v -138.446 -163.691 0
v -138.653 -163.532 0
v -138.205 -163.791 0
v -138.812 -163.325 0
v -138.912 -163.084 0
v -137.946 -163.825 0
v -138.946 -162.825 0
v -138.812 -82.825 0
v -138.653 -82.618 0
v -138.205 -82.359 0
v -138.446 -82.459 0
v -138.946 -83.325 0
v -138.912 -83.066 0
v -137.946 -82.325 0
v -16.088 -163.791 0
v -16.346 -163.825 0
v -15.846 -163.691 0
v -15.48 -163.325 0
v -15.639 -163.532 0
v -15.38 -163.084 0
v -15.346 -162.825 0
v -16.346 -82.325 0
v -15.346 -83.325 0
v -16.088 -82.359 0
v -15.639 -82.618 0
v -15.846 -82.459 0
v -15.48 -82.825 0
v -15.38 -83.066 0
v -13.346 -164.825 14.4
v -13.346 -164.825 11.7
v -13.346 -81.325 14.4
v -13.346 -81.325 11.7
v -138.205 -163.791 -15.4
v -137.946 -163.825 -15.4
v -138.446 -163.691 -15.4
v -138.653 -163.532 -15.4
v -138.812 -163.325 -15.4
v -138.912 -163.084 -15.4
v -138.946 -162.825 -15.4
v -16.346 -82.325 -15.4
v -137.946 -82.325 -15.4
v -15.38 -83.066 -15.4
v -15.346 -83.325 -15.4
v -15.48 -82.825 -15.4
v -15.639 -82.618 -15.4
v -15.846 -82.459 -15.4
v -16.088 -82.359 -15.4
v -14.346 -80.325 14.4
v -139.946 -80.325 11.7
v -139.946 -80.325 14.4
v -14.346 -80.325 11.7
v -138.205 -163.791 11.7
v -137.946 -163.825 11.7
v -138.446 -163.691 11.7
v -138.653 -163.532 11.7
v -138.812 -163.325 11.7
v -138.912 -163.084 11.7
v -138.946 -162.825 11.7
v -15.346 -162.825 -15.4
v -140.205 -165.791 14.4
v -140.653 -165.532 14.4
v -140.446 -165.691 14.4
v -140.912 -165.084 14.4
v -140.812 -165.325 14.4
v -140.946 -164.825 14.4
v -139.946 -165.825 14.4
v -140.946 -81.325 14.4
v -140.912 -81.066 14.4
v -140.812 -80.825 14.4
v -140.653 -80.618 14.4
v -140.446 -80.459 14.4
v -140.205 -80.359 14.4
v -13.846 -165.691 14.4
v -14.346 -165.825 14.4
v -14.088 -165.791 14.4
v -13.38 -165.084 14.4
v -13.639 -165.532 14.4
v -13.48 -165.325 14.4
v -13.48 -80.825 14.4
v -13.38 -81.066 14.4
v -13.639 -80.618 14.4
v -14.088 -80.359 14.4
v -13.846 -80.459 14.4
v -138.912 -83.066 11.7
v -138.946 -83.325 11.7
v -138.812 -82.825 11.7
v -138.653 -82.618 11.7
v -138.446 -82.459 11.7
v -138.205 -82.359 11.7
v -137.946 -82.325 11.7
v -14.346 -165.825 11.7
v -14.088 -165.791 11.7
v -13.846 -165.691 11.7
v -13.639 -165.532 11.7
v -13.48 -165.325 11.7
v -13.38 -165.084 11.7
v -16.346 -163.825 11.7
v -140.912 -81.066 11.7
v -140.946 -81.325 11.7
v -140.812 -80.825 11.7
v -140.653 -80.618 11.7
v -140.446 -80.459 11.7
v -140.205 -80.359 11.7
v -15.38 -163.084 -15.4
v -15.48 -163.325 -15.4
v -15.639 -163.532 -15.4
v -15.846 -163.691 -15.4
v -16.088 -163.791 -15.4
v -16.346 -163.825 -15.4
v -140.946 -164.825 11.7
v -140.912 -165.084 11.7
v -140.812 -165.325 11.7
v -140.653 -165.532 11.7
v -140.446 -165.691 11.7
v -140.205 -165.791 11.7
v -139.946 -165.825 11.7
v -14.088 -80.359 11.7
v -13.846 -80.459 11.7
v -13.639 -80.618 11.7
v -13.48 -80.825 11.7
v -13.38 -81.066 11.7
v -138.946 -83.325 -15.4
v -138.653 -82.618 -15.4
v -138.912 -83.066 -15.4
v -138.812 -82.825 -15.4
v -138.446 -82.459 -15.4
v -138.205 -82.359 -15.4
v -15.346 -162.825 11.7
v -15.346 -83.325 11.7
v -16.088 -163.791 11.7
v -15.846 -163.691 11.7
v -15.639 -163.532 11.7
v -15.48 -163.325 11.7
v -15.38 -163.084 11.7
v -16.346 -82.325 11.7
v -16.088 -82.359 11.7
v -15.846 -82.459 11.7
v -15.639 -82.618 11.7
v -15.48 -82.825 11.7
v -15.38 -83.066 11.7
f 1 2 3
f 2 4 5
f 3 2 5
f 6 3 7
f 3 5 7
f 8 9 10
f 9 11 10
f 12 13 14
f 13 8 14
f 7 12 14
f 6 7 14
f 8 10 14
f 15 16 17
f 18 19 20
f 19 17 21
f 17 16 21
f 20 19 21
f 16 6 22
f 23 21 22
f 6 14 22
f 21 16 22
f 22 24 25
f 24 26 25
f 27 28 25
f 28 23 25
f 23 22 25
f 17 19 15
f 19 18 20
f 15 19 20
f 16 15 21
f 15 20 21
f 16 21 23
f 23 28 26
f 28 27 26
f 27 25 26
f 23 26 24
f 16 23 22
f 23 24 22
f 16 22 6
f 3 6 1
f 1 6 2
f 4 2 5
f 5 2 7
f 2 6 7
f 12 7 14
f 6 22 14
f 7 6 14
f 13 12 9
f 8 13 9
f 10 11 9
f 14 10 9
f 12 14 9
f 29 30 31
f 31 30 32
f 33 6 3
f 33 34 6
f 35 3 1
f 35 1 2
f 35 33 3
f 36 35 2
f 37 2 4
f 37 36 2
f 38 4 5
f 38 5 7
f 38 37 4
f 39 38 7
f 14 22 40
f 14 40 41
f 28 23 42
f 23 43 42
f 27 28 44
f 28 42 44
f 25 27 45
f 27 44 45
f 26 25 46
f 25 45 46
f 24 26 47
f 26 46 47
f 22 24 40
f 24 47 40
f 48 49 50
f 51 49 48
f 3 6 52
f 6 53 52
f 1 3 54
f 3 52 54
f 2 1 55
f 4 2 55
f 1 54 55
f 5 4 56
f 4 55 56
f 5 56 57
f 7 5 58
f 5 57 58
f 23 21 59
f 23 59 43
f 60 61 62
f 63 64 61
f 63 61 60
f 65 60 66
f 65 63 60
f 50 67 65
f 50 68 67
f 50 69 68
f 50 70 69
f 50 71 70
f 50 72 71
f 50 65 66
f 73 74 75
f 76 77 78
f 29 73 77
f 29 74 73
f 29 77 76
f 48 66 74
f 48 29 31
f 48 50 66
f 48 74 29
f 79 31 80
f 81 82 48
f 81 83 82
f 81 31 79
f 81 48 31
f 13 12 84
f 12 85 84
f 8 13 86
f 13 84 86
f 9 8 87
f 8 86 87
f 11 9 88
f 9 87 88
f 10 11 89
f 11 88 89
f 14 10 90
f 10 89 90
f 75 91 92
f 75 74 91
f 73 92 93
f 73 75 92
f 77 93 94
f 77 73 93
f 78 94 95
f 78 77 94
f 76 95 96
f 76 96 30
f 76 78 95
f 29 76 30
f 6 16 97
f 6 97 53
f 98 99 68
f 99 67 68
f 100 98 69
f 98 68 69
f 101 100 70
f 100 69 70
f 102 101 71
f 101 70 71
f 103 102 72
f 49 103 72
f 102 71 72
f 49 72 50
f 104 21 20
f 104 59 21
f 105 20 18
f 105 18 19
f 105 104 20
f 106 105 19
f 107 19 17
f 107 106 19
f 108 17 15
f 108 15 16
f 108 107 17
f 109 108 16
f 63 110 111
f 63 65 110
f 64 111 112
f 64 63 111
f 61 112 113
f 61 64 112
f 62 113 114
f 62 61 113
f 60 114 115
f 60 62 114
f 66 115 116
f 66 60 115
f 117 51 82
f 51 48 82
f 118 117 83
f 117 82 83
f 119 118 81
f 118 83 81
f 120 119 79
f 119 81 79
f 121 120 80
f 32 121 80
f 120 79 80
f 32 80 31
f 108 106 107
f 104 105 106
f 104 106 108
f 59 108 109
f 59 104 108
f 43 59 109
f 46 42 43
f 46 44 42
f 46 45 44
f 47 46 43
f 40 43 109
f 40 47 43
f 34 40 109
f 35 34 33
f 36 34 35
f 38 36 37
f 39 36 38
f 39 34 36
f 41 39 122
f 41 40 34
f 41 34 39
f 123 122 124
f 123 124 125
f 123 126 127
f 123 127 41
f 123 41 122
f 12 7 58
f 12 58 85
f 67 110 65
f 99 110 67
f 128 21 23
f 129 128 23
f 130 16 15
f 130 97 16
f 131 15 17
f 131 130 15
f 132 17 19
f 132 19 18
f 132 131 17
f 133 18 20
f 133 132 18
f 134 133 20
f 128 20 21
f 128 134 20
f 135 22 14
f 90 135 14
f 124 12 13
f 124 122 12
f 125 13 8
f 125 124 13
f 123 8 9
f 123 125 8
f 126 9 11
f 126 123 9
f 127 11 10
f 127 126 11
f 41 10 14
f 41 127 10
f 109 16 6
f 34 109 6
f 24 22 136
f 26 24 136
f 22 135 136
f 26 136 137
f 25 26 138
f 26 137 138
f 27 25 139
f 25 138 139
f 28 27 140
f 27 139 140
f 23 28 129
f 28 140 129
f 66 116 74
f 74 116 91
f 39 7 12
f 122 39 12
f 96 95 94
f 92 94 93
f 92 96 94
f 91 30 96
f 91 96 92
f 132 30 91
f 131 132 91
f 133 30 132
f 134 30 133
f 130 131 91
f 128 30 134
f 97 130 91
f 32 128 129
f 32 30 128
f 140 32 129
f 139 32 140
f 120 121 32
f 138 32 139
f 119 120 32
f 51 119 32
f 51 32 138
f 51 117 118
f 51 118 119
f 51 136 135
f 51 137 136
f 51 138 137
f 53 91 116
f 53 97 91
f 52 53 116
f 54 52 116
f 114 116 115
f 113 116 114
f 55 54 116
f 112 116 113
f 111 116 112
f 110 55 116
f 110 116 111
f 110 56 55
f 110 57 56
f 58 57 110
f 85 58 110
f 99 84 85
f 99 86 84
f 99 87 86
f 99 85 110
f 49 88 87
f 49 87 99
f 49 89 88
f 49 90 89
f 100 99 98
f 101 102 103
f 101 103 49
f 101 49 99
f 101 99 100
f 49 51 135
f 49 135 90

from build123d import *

# Parameters (mm, degrees)
SKETCH1_W           = 127.6
SKETCH1_H           = 85.5
BOSS_EXTRUDE1_DEPTH = 14.4
SKETCH2_W           = 127.6
SKETCH2_H           = 85.5
SKETCH2_W_2         = 123.6
SKETCH2_H_2         = 81.5
CUT_EXTRUDE1_DEPTH  = 11.7
SKETCH3_W           = 123.6
SKETCH3_H           = 81.5
BOSS_EXTRUDE2_DEPTH = 15.4
FILLET1_R           = 1
FILLET2_R           = 1


with BuildPart() as part:
    # Sketch1 → Boss-Extrude1 (new body)
    with BuildSketch(Plane.XY):
        with Locations((-77.146382855, -123.07484112)):
            Rectangle(SKETCH1_W, SKETCH1_H)
    extrude(amount=BOSS_EXTRUDE1_DEPTH)

    # Sketch2 → Cut-Extrude1 (cut)
    with BuildSketch(Plane(origin=(0, 0, 0), x_dir=(-1, 0, 0), z_dir=(0, 0, -1))):
        with Locations((77.146382855, -123.07484112)):
            Rectangle(SKETCH2_W, SKETCH2_H)
        with Locations((77.146382855, -123.07484112)):
            Rectangle(SKETCH2_W_2, SKETCH2_H_2, mode=Mode.SUBTRACT)
    extrude(amount=-CUT_EXTRUDE1_DEPTH, mode=Mode.SUBTRACT)

    # Fillet1
    fillet1_edges = [part.edges().sort_by_distance(p)[0] for p in [
        (-138.946382855, -82.32484112, 5.85),
        (-138.946382855, -163.82484112, 5.85),
        (-15.346382855, -163.82484112, 5.85),
        (-15.346382855, -82.32484112, 5.85),
        (-13.346382855, -165.82484112, 13.05),
        (-140.946382855, -165.82484112, 13.05),
        (-140.946382855, -80.32484112, 13.05),
        (-13.346382855, -80.32484112, 13.05),
    ]]
    fillet(fillet1_edges, radius=FILLET1_R)


with BuildPart() as body_2:
    # Sketch3 → Boss-Extrude2 (new body)
    with BuildSketch(Plane(origin=(0, 0, 0), x_dir=(-1, 0, 0), z_dir=(0, 0, -1))):
        with Locations((77.146382855, -123.07484112)):
            Rectangle(SKETCH3_W, SKETCH3_H)
    extrude(amount=BOSS_EXTRUDE2_DEPTH)

    # Fillet2
    fillet2_edges = [body_2.edges().sort_by_distance(p)[0] for p in [
        (-138.946382855, -163.82484112, -7.7),
        (-15.346382855, -163.82484112, -7.7),
        (-15.346382855, -82.32484112, -7.7),
        (-138.946382855, -82.32484112, -7.7),
    ]]
    fillet(fillet2_edges, radius=FILLET2_R)


solid = Compound([part.part, body_2.part])
